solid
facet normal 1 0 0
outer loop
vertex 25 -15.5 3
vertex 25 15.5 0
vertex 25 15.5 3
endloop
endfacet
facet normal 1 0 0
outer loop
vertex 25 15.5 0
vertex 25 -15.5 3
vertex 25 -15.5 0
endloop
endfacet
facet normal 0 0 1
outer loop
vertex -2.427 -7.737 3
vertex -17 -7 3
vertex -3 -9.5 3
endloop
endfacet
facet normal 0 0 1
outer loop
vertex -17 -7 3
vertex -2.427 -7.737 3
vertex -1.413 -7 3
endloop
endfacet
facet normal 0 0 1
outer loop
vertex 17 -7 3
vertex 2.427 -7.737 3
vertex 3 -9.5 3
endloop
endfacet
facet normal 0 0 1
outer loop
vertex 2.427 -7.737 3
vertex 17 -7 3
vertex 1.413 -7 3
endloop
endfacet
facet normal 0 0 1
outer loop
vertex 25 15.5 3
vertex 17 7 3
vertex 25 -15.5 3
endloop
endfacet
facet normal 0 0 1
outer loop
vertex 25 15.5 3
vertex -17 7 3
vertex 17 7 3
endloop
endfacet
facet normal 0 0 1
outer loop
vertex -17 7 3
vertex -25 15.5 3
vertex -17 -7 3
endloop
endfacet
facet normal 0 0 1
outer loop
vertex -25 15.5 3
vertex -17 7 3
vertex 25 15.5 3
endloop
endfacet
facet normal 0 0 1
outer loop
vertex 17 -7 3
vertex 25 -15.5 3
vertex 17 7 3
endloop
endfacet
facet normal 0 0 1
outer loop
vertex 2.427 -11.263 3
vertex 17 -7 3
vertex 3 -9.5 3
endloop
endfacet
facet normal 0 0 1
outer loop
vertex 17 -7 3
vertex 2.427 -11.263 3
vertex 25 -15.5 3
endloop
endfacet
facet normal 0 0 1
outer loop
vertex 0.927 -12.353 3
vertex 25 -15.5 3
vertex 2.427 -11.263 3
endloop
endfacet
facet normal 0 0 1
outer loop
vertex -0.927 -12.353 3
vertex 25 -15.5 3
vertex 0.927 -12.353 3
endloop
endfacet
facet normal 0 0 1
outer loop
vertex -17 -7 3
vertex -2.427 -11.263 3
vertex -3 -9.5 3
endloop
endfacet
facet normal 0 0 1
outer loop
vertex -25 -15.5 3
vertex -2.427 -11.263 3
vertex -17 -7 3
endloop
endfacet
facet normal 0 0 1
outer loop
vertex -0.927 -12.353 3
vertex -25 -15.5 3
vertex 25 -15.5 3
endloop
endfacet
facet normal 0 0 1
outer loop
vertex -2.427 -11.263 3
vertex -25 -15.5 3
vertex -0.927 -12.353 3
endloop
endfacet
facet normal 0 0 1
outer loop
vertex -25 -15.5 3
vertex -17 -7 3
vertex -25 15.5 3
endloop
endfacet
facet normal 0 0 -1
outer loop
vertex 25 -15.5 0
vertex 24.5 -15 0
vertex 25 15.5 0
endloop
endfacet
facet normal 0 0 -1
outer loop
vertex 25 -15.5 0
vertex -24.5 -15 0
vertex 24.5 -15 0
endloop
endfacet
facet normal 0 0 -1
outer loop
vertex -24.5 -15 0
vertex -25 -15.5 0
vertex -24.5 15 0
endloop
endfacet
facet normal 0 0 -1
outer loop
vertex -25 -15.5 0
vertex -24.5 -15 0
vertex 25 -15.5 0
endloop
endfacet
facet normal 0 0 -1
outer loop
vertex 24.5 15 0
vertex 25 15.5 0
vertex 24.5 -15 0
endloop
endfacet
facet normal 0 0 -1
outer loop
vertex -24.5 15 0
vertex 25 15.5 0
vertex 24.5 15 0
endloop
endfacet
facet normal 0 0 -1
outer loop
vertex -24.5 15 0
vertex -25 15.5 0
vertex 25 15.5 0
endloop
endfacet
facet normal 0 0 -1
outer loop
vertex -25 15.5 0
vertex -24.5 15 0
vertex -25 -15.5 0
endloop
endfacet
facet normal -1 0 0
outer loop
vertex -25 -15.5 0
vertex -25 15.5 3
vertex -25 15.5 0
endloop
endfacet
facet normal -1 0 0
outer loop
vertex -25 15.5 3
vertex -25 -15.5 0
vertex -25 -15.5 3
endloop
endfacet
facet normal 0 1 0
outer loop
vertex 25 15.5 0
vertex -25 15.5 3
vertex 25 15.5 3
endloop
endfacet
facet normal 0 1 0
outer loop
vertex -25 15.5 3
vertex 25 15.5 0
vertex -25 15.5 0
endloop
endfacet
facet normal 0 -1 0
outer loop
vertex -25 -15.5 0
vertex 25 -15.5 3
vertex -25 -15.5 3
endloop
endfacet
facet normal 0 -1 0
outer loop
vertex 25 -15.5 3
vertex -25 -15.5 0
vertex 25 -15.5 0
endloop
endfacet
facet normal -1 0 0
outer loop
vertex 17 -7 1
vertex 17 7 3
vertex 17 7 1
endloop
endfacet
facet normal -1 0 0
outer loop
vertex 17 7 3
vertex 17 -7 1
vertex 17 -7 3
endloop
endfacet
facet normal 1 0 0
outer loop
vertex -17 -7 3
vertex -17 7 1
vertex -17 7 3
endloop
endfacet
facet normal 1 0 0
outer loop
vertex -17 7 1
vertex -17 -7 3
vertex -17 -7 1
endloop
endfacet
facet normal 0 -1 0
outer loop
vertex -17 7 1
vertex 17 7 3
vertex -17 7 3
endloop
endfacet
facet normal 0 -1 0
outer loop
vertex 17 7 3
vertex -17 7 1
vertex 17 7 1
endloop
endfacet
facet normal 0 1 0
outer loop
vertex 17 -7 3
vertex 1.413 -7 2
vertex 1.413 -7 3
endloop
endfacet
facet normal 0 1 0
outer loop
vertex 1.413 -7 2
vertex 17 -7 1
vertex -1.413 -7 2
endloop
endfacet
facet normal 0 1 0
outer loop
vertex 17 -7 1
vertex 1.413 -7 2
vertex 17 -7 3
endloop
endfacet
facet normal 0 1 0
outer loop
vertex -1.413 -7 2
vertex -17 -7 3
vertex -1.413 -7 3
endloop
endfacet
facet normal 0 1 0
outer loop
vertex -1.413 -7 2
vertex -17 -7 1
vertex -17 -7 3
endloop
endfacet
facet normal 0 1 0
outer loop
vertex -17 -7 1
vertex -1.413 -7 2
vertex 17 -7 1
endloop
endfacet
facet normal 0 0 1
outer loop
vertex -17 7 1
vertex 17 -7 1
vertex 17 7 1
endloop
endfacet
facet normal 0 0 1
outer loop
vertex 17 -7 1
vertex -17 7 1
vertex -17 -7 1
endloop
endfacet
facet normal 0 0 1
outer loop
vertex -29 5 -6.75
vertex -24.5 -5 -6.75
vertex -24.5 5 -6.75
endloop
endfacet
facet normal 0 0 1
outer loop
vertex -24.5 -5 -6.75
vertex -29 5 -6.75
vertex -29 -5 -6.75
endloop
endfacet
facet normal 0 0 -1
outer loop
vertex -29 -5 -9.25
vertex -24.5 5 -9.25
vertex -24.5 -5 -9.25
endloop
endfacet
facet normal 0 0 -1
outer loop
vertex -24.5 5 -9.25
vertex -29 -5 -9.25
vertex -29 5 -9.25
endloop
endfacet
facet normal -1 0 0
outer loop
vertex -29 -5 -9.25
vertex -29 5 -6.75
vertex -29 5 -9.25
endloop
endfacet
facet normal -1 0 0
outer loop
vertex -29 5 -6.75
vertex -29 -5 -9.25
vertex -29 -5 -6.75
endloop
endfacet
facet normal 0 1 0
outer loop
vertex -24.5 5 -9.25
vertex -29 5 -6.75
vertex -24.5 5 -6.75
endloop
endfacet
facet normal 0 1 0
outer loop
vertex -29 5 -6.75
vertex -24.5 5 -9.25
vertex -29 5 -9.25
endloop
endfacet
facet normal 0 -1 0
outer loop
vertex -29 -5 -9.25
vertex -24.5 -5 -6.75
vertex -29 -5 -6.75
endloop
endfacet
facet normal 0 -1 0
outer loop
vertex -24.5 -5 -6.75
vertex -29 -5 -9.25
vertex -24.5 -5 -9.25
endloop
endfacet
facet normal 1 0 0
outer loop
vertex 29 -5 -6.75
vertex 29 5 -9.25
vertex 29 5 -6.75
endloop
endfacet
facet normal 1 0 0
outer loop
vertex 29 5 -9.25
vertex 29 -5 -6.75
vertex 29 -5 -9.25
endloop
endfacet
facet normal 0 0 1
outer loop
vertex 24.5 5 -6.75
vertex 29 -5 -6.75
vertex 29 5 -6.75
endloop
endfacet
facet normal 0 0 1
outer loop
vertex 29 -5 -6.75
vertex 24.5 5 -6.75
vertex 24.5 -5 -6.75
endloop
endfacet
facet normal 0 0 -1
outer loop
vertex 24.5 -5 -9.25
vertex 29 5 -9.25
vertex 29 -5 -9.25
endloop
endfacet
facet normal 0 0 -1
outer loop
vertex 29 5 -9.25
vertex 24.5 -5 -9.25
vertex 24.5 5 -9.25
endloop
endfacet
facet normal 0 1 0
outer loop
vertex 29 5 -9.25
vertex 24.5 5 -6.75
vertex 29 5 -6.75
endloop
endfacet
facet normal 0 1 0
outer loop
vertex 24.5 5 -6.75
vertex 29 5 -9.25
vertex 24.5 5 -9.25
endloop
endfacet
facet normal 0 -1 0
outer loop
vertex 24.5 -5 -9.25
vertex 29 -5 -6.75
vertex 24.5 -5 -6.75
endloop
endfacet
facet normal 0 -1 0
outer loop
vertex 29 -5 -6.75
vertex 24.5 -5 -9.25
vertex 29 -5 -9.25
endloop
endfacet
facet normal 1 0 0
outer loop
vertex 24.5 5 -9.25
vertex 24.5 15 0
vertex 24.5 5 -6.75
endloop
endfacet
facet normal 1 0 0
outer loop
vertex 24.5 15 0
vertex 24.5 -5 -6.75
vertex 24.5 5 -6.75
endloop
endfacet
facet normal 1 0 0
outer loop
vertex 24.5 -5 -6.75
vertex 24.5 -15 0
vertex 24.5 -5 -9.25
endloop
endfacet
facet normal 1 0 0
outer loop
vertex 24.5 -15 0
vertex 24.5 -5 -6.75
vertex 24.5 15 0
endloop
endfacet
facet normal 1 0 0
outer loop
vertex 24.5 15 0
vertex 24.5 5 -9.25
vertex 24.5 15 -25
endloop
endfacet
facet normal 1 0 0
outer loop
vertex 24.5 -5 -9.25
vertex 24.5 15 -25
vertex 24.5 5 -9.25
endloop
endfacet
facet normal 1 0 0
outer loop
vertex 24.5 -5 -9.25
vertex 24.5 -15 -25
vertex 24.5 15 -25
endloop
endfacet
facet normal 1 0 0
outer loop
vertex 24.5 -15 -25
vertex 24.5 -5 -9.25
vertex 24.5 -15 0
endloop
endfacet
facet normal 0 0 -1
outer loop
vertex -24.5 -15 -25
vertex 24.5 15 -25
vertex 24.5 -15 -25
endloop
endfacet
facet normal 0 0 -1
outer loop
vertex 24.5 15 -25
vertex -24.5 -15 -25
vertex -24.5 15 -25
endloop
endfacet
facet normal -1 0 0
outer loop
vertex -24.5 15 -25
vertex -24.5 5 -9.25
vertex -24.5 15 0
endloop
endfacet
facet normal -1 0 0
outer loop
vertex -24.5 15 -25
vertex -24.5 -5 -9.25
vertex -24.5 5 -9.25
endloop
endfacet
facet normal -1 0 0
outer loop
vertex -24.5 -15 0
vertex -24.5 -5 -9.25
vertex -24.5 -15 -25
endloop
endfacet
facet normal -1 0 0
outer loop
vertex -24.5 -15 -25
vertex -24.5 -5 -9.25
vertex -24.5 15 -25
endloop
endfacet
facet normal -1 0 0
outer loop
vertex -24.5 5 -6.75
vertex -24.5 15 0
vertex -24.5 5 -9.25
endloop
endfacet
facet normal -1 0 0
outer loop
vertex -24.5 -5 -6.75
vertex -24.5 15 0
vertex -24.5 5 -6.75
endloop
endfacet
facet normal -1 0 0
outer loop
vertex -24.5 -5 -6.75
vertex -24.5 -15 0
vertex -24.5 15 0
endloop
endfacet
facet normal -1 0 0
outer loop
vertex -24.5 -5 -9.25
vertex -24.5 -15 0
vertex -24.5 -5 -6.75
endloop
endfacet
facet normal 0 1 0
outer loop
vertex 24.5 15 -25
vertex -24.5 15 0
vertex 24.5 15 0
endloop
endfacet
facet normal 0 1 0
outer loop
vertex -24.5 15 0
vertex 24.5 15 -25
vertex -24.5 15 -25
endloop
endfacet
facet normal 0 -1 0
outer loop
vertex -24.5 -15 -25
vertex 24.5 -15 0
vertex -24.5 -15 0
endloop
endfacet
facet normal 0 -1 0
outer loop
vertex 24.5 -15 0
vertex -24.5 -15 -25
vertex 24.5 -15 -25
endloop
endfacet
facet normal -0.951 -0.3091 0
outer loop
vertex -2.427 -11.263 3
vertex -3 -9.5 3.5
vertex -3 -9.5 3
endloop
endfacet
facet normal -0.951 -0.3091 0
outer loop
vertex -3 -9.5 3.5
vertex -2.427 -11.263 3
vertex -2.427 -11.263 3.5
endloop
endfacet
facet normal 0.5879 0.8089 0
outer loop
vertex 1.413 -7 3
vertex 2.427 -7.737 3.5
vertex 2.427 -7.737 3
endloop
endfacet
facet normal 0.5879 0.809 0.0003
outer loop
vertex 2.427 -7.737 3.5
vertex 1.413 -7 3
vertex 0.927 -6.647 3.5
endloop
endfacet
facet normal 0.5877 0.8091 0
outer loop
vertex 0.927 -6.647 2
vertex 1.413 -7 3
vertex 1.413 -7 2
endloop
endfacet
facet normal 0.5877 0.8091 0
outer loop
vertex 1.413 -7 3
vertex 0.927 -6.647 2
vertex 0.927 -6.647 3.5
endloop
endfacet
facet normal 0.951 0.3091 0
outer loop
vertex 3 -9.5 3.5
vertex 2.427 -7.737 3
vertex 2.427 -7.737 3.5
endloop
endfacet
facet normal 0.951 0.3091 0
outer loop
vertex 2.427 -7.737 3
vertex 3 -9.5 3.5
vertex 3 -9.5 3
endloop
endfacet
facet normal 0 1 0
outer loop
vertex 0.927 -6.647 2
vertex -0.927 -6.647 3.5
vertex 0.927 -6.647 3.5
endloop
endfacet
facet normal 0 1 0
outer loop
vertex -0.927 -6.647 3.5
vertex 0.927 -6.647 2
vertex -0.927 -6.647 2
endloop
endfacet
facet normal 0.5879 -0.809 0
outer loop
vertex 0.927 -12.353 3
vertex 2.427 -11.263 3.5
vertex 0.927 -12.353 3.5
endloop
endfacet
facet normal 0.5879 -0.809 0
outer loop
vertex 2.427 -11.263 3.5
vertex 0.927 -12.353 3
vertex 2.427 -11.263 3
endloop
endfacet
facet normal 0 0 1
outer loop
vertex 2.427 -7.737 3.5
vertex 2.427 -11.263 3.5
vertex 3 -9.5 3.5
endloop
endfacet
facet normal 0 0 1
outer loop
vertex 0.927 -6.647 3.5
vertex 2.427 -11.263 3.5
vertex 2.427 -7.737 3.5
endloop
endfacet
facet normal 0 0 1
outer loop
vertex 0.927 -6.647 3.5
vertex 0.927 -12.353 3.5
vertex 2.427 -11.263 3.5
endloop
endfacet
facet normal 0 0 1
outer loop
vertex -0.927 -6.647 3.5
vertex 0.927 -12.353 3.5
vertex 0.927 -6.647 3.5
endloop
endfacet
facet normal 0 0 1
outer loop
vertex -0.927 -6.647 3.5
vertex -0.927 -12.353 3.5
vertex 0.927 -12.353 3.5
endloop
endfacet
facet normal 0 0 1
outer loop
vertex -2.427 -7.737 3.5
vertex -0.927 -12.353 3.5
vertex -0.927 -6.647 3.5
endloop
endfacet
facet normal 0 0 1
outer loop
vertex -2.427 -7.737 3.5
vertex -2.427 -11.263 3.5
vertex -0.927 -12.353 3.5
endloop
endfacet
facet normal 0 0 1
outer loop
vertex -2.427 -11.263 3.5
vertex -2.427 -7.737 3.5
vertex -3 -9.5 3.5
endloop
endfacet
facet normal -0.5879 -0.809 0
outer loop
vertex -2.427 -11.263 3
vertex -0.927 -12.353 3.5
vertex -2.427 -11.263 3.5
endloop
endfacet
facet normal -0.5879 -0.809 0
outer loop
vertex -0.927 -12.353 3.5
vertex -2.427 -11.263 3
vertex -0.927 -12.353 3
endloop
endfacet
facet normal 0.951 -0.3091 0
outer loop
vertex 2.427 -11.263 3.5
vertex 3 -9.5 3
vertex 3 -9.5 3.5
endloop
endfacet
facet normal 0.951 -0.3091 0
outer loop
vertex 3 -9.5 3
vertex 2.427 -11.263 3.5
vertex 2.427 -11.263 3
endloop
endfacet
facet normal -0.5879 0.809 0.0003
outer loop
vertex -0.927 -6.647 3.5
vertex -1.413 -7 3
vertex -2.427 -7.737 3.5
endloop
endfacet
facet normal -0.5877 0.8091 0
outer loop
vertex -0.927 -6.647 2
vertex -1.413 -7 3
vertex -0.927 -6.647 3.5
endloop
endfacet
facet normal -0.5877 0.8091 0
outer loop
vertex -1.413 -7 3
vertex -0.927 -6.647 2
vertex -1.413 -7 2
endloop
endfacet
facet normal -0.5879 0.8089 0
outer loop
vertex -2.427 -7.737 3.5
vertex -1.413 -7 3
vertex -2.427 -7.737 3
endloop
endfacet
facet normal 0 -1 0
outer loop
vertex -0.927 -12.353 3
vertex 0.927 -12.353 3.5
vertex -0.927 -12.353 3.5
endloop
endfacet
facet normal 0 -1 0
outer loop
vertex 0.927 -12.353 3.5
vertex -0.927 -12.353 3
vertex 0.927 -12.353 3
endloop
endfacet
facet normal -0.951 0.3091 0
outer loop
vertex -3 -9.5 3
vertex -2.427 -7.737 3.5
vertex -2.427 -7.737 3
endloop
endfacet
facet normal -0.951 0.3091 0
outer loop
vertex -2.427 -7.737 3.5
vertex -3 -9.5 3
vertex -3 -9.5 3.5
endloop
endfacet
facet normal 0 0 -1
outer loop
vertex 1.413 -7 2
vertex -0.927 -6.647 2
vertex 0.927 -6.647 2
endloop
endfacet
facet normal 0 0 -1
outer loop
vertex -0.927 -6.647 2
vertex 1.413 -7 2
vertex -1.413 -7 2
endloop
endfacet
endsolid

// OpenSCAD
// Parameters
overall_width = 48; //[24:96:1]
overall_height = 29; //[15:58:1]
overall_depth = 25; //[13:50:1]
bezel_width = 50; //[25:100:1]
bezel_height = 31; //[16:62:1]
bezel_thickness = 3; //[1.5:6:0.5]
corner_radius = 2; //[0:6:0.5]
panel_cutout_width = 45.2; //[22.6:90.4:0.1]
panel_cutout_height = 26.2; //[13.1:52.4:0.1]
panel_thickness_range_min = 1; //[0.5:3:0.5]
panel_thickness_range_max = 3; //[1.5:6:0.5]
display_window_width = 34; //[17:68:1]
display_window_height = 14; //[7:28:1]
display_window_offset_x = 0; //[-10:10:0.5]
display_window_offset_y = 0; //[-10:10:0.5]
tab_width = 6; //[3:12:0.5]
tab_height = 10; //[5:20:0.5]
tab_depth = 2.5; //[1:6:0.5]
tab_offset_z = 8; //[0:20:0.5]
tolerance_xy = 0.2; //[0:1:0.05]
tolerance_z = 0.2; //[0:1:0.05]
overlap = 1; //[0.5:2:0.1]
rear_housing_clearance_xy = 0.5; //[0.2:2:0.1]
rear_housing_clearance_z = 1; //[0.5:3:0.1]
pcb_thickness = 1.6; //[0.8:3.2:0.1]
pcb_margin_xy = 2; //[1:6:0.5]
pcb_offset_z = 6; //[2:15:0.5]
button_diameter = 6; //[3:12:0.5]
button_height = 1.5; //[0.8:4:0.1]
button_offset_x = 0; //[-15:15:0.5]
button_offset_y = -9.5; //[-20:20:0.5]
panel_cutout_depth = 5; //[1:20:1]

// Panel Meter - complete geometry
module panel_meter() {
  color("Black") {
    // Front Bezel with Display Window
    difference() {
      translate([0, 0, bezel_thickness/2])
        cube([bezel_width, bezel_height, bezel_thickness], center=true);
      translate([display_window_offset_x, display_window_offset_y, bezel_thickness/2])
        cube([display_window_width, display_window_height, bezel_thickness + 2*overlap], center=true);
    }
    // Rear Body
    translate([0, 0, -overall_depth/2 + overlap])
      cube([overall_width, overall_height, overall_depth], center=true);
    // Retention Tabs
    translate([-(overall_width/2 + tab_width/2 - overlap), 0, -tab_offset_z])
      cube([tab_width, tab_height, tab_depth], center=true);
    translate([(overall_width/2 + tab_width/2 - overlap), 0, -tab_offset_z])
      cube([tab_width, tab_height, tab_depth], center=true);
    // PCB Envelope
    translate([0, 0, -pcb_offset_z])
      cube([overall_width - 2*pcb_margin_xy, overall_height - 2*pcb_margin_xy, pcb_thickness], center=true);
  }
}

// Panel Meter Button - complete geometry
module panel_meter_button() {
  color("White") {
    translate([button_offset_x, button_offset_y, bezel_thickness + button_height/2 - overlap])
      cylinder(r=button_diameter/2, h=button_height, center=true);
  }
}

// Panel Meter Cutout - complete geometry
module panel_meter_cutout() {
  color("Silver") {
    translate([0, 0, -panel_cutout_depth/2])
      cube([panel_cutout_width, panel_cutout_height, panel_cutout_depth], center=true);
    translate([0, 0, -(overall_depth + rear_housing_clearance_z)/2 + overlap])
      cube([overall_width + 2*rear_housing_clearance_xy, overall_height + 2*rear_housing_clearance_xy, overall_depth + rear_housing_clearance_z], center=true);
  }
}

// Assembly
module assembly() {
  panel_meter();
  panel_meter_button();
  panel_meter_cutout();
}

assembly();
